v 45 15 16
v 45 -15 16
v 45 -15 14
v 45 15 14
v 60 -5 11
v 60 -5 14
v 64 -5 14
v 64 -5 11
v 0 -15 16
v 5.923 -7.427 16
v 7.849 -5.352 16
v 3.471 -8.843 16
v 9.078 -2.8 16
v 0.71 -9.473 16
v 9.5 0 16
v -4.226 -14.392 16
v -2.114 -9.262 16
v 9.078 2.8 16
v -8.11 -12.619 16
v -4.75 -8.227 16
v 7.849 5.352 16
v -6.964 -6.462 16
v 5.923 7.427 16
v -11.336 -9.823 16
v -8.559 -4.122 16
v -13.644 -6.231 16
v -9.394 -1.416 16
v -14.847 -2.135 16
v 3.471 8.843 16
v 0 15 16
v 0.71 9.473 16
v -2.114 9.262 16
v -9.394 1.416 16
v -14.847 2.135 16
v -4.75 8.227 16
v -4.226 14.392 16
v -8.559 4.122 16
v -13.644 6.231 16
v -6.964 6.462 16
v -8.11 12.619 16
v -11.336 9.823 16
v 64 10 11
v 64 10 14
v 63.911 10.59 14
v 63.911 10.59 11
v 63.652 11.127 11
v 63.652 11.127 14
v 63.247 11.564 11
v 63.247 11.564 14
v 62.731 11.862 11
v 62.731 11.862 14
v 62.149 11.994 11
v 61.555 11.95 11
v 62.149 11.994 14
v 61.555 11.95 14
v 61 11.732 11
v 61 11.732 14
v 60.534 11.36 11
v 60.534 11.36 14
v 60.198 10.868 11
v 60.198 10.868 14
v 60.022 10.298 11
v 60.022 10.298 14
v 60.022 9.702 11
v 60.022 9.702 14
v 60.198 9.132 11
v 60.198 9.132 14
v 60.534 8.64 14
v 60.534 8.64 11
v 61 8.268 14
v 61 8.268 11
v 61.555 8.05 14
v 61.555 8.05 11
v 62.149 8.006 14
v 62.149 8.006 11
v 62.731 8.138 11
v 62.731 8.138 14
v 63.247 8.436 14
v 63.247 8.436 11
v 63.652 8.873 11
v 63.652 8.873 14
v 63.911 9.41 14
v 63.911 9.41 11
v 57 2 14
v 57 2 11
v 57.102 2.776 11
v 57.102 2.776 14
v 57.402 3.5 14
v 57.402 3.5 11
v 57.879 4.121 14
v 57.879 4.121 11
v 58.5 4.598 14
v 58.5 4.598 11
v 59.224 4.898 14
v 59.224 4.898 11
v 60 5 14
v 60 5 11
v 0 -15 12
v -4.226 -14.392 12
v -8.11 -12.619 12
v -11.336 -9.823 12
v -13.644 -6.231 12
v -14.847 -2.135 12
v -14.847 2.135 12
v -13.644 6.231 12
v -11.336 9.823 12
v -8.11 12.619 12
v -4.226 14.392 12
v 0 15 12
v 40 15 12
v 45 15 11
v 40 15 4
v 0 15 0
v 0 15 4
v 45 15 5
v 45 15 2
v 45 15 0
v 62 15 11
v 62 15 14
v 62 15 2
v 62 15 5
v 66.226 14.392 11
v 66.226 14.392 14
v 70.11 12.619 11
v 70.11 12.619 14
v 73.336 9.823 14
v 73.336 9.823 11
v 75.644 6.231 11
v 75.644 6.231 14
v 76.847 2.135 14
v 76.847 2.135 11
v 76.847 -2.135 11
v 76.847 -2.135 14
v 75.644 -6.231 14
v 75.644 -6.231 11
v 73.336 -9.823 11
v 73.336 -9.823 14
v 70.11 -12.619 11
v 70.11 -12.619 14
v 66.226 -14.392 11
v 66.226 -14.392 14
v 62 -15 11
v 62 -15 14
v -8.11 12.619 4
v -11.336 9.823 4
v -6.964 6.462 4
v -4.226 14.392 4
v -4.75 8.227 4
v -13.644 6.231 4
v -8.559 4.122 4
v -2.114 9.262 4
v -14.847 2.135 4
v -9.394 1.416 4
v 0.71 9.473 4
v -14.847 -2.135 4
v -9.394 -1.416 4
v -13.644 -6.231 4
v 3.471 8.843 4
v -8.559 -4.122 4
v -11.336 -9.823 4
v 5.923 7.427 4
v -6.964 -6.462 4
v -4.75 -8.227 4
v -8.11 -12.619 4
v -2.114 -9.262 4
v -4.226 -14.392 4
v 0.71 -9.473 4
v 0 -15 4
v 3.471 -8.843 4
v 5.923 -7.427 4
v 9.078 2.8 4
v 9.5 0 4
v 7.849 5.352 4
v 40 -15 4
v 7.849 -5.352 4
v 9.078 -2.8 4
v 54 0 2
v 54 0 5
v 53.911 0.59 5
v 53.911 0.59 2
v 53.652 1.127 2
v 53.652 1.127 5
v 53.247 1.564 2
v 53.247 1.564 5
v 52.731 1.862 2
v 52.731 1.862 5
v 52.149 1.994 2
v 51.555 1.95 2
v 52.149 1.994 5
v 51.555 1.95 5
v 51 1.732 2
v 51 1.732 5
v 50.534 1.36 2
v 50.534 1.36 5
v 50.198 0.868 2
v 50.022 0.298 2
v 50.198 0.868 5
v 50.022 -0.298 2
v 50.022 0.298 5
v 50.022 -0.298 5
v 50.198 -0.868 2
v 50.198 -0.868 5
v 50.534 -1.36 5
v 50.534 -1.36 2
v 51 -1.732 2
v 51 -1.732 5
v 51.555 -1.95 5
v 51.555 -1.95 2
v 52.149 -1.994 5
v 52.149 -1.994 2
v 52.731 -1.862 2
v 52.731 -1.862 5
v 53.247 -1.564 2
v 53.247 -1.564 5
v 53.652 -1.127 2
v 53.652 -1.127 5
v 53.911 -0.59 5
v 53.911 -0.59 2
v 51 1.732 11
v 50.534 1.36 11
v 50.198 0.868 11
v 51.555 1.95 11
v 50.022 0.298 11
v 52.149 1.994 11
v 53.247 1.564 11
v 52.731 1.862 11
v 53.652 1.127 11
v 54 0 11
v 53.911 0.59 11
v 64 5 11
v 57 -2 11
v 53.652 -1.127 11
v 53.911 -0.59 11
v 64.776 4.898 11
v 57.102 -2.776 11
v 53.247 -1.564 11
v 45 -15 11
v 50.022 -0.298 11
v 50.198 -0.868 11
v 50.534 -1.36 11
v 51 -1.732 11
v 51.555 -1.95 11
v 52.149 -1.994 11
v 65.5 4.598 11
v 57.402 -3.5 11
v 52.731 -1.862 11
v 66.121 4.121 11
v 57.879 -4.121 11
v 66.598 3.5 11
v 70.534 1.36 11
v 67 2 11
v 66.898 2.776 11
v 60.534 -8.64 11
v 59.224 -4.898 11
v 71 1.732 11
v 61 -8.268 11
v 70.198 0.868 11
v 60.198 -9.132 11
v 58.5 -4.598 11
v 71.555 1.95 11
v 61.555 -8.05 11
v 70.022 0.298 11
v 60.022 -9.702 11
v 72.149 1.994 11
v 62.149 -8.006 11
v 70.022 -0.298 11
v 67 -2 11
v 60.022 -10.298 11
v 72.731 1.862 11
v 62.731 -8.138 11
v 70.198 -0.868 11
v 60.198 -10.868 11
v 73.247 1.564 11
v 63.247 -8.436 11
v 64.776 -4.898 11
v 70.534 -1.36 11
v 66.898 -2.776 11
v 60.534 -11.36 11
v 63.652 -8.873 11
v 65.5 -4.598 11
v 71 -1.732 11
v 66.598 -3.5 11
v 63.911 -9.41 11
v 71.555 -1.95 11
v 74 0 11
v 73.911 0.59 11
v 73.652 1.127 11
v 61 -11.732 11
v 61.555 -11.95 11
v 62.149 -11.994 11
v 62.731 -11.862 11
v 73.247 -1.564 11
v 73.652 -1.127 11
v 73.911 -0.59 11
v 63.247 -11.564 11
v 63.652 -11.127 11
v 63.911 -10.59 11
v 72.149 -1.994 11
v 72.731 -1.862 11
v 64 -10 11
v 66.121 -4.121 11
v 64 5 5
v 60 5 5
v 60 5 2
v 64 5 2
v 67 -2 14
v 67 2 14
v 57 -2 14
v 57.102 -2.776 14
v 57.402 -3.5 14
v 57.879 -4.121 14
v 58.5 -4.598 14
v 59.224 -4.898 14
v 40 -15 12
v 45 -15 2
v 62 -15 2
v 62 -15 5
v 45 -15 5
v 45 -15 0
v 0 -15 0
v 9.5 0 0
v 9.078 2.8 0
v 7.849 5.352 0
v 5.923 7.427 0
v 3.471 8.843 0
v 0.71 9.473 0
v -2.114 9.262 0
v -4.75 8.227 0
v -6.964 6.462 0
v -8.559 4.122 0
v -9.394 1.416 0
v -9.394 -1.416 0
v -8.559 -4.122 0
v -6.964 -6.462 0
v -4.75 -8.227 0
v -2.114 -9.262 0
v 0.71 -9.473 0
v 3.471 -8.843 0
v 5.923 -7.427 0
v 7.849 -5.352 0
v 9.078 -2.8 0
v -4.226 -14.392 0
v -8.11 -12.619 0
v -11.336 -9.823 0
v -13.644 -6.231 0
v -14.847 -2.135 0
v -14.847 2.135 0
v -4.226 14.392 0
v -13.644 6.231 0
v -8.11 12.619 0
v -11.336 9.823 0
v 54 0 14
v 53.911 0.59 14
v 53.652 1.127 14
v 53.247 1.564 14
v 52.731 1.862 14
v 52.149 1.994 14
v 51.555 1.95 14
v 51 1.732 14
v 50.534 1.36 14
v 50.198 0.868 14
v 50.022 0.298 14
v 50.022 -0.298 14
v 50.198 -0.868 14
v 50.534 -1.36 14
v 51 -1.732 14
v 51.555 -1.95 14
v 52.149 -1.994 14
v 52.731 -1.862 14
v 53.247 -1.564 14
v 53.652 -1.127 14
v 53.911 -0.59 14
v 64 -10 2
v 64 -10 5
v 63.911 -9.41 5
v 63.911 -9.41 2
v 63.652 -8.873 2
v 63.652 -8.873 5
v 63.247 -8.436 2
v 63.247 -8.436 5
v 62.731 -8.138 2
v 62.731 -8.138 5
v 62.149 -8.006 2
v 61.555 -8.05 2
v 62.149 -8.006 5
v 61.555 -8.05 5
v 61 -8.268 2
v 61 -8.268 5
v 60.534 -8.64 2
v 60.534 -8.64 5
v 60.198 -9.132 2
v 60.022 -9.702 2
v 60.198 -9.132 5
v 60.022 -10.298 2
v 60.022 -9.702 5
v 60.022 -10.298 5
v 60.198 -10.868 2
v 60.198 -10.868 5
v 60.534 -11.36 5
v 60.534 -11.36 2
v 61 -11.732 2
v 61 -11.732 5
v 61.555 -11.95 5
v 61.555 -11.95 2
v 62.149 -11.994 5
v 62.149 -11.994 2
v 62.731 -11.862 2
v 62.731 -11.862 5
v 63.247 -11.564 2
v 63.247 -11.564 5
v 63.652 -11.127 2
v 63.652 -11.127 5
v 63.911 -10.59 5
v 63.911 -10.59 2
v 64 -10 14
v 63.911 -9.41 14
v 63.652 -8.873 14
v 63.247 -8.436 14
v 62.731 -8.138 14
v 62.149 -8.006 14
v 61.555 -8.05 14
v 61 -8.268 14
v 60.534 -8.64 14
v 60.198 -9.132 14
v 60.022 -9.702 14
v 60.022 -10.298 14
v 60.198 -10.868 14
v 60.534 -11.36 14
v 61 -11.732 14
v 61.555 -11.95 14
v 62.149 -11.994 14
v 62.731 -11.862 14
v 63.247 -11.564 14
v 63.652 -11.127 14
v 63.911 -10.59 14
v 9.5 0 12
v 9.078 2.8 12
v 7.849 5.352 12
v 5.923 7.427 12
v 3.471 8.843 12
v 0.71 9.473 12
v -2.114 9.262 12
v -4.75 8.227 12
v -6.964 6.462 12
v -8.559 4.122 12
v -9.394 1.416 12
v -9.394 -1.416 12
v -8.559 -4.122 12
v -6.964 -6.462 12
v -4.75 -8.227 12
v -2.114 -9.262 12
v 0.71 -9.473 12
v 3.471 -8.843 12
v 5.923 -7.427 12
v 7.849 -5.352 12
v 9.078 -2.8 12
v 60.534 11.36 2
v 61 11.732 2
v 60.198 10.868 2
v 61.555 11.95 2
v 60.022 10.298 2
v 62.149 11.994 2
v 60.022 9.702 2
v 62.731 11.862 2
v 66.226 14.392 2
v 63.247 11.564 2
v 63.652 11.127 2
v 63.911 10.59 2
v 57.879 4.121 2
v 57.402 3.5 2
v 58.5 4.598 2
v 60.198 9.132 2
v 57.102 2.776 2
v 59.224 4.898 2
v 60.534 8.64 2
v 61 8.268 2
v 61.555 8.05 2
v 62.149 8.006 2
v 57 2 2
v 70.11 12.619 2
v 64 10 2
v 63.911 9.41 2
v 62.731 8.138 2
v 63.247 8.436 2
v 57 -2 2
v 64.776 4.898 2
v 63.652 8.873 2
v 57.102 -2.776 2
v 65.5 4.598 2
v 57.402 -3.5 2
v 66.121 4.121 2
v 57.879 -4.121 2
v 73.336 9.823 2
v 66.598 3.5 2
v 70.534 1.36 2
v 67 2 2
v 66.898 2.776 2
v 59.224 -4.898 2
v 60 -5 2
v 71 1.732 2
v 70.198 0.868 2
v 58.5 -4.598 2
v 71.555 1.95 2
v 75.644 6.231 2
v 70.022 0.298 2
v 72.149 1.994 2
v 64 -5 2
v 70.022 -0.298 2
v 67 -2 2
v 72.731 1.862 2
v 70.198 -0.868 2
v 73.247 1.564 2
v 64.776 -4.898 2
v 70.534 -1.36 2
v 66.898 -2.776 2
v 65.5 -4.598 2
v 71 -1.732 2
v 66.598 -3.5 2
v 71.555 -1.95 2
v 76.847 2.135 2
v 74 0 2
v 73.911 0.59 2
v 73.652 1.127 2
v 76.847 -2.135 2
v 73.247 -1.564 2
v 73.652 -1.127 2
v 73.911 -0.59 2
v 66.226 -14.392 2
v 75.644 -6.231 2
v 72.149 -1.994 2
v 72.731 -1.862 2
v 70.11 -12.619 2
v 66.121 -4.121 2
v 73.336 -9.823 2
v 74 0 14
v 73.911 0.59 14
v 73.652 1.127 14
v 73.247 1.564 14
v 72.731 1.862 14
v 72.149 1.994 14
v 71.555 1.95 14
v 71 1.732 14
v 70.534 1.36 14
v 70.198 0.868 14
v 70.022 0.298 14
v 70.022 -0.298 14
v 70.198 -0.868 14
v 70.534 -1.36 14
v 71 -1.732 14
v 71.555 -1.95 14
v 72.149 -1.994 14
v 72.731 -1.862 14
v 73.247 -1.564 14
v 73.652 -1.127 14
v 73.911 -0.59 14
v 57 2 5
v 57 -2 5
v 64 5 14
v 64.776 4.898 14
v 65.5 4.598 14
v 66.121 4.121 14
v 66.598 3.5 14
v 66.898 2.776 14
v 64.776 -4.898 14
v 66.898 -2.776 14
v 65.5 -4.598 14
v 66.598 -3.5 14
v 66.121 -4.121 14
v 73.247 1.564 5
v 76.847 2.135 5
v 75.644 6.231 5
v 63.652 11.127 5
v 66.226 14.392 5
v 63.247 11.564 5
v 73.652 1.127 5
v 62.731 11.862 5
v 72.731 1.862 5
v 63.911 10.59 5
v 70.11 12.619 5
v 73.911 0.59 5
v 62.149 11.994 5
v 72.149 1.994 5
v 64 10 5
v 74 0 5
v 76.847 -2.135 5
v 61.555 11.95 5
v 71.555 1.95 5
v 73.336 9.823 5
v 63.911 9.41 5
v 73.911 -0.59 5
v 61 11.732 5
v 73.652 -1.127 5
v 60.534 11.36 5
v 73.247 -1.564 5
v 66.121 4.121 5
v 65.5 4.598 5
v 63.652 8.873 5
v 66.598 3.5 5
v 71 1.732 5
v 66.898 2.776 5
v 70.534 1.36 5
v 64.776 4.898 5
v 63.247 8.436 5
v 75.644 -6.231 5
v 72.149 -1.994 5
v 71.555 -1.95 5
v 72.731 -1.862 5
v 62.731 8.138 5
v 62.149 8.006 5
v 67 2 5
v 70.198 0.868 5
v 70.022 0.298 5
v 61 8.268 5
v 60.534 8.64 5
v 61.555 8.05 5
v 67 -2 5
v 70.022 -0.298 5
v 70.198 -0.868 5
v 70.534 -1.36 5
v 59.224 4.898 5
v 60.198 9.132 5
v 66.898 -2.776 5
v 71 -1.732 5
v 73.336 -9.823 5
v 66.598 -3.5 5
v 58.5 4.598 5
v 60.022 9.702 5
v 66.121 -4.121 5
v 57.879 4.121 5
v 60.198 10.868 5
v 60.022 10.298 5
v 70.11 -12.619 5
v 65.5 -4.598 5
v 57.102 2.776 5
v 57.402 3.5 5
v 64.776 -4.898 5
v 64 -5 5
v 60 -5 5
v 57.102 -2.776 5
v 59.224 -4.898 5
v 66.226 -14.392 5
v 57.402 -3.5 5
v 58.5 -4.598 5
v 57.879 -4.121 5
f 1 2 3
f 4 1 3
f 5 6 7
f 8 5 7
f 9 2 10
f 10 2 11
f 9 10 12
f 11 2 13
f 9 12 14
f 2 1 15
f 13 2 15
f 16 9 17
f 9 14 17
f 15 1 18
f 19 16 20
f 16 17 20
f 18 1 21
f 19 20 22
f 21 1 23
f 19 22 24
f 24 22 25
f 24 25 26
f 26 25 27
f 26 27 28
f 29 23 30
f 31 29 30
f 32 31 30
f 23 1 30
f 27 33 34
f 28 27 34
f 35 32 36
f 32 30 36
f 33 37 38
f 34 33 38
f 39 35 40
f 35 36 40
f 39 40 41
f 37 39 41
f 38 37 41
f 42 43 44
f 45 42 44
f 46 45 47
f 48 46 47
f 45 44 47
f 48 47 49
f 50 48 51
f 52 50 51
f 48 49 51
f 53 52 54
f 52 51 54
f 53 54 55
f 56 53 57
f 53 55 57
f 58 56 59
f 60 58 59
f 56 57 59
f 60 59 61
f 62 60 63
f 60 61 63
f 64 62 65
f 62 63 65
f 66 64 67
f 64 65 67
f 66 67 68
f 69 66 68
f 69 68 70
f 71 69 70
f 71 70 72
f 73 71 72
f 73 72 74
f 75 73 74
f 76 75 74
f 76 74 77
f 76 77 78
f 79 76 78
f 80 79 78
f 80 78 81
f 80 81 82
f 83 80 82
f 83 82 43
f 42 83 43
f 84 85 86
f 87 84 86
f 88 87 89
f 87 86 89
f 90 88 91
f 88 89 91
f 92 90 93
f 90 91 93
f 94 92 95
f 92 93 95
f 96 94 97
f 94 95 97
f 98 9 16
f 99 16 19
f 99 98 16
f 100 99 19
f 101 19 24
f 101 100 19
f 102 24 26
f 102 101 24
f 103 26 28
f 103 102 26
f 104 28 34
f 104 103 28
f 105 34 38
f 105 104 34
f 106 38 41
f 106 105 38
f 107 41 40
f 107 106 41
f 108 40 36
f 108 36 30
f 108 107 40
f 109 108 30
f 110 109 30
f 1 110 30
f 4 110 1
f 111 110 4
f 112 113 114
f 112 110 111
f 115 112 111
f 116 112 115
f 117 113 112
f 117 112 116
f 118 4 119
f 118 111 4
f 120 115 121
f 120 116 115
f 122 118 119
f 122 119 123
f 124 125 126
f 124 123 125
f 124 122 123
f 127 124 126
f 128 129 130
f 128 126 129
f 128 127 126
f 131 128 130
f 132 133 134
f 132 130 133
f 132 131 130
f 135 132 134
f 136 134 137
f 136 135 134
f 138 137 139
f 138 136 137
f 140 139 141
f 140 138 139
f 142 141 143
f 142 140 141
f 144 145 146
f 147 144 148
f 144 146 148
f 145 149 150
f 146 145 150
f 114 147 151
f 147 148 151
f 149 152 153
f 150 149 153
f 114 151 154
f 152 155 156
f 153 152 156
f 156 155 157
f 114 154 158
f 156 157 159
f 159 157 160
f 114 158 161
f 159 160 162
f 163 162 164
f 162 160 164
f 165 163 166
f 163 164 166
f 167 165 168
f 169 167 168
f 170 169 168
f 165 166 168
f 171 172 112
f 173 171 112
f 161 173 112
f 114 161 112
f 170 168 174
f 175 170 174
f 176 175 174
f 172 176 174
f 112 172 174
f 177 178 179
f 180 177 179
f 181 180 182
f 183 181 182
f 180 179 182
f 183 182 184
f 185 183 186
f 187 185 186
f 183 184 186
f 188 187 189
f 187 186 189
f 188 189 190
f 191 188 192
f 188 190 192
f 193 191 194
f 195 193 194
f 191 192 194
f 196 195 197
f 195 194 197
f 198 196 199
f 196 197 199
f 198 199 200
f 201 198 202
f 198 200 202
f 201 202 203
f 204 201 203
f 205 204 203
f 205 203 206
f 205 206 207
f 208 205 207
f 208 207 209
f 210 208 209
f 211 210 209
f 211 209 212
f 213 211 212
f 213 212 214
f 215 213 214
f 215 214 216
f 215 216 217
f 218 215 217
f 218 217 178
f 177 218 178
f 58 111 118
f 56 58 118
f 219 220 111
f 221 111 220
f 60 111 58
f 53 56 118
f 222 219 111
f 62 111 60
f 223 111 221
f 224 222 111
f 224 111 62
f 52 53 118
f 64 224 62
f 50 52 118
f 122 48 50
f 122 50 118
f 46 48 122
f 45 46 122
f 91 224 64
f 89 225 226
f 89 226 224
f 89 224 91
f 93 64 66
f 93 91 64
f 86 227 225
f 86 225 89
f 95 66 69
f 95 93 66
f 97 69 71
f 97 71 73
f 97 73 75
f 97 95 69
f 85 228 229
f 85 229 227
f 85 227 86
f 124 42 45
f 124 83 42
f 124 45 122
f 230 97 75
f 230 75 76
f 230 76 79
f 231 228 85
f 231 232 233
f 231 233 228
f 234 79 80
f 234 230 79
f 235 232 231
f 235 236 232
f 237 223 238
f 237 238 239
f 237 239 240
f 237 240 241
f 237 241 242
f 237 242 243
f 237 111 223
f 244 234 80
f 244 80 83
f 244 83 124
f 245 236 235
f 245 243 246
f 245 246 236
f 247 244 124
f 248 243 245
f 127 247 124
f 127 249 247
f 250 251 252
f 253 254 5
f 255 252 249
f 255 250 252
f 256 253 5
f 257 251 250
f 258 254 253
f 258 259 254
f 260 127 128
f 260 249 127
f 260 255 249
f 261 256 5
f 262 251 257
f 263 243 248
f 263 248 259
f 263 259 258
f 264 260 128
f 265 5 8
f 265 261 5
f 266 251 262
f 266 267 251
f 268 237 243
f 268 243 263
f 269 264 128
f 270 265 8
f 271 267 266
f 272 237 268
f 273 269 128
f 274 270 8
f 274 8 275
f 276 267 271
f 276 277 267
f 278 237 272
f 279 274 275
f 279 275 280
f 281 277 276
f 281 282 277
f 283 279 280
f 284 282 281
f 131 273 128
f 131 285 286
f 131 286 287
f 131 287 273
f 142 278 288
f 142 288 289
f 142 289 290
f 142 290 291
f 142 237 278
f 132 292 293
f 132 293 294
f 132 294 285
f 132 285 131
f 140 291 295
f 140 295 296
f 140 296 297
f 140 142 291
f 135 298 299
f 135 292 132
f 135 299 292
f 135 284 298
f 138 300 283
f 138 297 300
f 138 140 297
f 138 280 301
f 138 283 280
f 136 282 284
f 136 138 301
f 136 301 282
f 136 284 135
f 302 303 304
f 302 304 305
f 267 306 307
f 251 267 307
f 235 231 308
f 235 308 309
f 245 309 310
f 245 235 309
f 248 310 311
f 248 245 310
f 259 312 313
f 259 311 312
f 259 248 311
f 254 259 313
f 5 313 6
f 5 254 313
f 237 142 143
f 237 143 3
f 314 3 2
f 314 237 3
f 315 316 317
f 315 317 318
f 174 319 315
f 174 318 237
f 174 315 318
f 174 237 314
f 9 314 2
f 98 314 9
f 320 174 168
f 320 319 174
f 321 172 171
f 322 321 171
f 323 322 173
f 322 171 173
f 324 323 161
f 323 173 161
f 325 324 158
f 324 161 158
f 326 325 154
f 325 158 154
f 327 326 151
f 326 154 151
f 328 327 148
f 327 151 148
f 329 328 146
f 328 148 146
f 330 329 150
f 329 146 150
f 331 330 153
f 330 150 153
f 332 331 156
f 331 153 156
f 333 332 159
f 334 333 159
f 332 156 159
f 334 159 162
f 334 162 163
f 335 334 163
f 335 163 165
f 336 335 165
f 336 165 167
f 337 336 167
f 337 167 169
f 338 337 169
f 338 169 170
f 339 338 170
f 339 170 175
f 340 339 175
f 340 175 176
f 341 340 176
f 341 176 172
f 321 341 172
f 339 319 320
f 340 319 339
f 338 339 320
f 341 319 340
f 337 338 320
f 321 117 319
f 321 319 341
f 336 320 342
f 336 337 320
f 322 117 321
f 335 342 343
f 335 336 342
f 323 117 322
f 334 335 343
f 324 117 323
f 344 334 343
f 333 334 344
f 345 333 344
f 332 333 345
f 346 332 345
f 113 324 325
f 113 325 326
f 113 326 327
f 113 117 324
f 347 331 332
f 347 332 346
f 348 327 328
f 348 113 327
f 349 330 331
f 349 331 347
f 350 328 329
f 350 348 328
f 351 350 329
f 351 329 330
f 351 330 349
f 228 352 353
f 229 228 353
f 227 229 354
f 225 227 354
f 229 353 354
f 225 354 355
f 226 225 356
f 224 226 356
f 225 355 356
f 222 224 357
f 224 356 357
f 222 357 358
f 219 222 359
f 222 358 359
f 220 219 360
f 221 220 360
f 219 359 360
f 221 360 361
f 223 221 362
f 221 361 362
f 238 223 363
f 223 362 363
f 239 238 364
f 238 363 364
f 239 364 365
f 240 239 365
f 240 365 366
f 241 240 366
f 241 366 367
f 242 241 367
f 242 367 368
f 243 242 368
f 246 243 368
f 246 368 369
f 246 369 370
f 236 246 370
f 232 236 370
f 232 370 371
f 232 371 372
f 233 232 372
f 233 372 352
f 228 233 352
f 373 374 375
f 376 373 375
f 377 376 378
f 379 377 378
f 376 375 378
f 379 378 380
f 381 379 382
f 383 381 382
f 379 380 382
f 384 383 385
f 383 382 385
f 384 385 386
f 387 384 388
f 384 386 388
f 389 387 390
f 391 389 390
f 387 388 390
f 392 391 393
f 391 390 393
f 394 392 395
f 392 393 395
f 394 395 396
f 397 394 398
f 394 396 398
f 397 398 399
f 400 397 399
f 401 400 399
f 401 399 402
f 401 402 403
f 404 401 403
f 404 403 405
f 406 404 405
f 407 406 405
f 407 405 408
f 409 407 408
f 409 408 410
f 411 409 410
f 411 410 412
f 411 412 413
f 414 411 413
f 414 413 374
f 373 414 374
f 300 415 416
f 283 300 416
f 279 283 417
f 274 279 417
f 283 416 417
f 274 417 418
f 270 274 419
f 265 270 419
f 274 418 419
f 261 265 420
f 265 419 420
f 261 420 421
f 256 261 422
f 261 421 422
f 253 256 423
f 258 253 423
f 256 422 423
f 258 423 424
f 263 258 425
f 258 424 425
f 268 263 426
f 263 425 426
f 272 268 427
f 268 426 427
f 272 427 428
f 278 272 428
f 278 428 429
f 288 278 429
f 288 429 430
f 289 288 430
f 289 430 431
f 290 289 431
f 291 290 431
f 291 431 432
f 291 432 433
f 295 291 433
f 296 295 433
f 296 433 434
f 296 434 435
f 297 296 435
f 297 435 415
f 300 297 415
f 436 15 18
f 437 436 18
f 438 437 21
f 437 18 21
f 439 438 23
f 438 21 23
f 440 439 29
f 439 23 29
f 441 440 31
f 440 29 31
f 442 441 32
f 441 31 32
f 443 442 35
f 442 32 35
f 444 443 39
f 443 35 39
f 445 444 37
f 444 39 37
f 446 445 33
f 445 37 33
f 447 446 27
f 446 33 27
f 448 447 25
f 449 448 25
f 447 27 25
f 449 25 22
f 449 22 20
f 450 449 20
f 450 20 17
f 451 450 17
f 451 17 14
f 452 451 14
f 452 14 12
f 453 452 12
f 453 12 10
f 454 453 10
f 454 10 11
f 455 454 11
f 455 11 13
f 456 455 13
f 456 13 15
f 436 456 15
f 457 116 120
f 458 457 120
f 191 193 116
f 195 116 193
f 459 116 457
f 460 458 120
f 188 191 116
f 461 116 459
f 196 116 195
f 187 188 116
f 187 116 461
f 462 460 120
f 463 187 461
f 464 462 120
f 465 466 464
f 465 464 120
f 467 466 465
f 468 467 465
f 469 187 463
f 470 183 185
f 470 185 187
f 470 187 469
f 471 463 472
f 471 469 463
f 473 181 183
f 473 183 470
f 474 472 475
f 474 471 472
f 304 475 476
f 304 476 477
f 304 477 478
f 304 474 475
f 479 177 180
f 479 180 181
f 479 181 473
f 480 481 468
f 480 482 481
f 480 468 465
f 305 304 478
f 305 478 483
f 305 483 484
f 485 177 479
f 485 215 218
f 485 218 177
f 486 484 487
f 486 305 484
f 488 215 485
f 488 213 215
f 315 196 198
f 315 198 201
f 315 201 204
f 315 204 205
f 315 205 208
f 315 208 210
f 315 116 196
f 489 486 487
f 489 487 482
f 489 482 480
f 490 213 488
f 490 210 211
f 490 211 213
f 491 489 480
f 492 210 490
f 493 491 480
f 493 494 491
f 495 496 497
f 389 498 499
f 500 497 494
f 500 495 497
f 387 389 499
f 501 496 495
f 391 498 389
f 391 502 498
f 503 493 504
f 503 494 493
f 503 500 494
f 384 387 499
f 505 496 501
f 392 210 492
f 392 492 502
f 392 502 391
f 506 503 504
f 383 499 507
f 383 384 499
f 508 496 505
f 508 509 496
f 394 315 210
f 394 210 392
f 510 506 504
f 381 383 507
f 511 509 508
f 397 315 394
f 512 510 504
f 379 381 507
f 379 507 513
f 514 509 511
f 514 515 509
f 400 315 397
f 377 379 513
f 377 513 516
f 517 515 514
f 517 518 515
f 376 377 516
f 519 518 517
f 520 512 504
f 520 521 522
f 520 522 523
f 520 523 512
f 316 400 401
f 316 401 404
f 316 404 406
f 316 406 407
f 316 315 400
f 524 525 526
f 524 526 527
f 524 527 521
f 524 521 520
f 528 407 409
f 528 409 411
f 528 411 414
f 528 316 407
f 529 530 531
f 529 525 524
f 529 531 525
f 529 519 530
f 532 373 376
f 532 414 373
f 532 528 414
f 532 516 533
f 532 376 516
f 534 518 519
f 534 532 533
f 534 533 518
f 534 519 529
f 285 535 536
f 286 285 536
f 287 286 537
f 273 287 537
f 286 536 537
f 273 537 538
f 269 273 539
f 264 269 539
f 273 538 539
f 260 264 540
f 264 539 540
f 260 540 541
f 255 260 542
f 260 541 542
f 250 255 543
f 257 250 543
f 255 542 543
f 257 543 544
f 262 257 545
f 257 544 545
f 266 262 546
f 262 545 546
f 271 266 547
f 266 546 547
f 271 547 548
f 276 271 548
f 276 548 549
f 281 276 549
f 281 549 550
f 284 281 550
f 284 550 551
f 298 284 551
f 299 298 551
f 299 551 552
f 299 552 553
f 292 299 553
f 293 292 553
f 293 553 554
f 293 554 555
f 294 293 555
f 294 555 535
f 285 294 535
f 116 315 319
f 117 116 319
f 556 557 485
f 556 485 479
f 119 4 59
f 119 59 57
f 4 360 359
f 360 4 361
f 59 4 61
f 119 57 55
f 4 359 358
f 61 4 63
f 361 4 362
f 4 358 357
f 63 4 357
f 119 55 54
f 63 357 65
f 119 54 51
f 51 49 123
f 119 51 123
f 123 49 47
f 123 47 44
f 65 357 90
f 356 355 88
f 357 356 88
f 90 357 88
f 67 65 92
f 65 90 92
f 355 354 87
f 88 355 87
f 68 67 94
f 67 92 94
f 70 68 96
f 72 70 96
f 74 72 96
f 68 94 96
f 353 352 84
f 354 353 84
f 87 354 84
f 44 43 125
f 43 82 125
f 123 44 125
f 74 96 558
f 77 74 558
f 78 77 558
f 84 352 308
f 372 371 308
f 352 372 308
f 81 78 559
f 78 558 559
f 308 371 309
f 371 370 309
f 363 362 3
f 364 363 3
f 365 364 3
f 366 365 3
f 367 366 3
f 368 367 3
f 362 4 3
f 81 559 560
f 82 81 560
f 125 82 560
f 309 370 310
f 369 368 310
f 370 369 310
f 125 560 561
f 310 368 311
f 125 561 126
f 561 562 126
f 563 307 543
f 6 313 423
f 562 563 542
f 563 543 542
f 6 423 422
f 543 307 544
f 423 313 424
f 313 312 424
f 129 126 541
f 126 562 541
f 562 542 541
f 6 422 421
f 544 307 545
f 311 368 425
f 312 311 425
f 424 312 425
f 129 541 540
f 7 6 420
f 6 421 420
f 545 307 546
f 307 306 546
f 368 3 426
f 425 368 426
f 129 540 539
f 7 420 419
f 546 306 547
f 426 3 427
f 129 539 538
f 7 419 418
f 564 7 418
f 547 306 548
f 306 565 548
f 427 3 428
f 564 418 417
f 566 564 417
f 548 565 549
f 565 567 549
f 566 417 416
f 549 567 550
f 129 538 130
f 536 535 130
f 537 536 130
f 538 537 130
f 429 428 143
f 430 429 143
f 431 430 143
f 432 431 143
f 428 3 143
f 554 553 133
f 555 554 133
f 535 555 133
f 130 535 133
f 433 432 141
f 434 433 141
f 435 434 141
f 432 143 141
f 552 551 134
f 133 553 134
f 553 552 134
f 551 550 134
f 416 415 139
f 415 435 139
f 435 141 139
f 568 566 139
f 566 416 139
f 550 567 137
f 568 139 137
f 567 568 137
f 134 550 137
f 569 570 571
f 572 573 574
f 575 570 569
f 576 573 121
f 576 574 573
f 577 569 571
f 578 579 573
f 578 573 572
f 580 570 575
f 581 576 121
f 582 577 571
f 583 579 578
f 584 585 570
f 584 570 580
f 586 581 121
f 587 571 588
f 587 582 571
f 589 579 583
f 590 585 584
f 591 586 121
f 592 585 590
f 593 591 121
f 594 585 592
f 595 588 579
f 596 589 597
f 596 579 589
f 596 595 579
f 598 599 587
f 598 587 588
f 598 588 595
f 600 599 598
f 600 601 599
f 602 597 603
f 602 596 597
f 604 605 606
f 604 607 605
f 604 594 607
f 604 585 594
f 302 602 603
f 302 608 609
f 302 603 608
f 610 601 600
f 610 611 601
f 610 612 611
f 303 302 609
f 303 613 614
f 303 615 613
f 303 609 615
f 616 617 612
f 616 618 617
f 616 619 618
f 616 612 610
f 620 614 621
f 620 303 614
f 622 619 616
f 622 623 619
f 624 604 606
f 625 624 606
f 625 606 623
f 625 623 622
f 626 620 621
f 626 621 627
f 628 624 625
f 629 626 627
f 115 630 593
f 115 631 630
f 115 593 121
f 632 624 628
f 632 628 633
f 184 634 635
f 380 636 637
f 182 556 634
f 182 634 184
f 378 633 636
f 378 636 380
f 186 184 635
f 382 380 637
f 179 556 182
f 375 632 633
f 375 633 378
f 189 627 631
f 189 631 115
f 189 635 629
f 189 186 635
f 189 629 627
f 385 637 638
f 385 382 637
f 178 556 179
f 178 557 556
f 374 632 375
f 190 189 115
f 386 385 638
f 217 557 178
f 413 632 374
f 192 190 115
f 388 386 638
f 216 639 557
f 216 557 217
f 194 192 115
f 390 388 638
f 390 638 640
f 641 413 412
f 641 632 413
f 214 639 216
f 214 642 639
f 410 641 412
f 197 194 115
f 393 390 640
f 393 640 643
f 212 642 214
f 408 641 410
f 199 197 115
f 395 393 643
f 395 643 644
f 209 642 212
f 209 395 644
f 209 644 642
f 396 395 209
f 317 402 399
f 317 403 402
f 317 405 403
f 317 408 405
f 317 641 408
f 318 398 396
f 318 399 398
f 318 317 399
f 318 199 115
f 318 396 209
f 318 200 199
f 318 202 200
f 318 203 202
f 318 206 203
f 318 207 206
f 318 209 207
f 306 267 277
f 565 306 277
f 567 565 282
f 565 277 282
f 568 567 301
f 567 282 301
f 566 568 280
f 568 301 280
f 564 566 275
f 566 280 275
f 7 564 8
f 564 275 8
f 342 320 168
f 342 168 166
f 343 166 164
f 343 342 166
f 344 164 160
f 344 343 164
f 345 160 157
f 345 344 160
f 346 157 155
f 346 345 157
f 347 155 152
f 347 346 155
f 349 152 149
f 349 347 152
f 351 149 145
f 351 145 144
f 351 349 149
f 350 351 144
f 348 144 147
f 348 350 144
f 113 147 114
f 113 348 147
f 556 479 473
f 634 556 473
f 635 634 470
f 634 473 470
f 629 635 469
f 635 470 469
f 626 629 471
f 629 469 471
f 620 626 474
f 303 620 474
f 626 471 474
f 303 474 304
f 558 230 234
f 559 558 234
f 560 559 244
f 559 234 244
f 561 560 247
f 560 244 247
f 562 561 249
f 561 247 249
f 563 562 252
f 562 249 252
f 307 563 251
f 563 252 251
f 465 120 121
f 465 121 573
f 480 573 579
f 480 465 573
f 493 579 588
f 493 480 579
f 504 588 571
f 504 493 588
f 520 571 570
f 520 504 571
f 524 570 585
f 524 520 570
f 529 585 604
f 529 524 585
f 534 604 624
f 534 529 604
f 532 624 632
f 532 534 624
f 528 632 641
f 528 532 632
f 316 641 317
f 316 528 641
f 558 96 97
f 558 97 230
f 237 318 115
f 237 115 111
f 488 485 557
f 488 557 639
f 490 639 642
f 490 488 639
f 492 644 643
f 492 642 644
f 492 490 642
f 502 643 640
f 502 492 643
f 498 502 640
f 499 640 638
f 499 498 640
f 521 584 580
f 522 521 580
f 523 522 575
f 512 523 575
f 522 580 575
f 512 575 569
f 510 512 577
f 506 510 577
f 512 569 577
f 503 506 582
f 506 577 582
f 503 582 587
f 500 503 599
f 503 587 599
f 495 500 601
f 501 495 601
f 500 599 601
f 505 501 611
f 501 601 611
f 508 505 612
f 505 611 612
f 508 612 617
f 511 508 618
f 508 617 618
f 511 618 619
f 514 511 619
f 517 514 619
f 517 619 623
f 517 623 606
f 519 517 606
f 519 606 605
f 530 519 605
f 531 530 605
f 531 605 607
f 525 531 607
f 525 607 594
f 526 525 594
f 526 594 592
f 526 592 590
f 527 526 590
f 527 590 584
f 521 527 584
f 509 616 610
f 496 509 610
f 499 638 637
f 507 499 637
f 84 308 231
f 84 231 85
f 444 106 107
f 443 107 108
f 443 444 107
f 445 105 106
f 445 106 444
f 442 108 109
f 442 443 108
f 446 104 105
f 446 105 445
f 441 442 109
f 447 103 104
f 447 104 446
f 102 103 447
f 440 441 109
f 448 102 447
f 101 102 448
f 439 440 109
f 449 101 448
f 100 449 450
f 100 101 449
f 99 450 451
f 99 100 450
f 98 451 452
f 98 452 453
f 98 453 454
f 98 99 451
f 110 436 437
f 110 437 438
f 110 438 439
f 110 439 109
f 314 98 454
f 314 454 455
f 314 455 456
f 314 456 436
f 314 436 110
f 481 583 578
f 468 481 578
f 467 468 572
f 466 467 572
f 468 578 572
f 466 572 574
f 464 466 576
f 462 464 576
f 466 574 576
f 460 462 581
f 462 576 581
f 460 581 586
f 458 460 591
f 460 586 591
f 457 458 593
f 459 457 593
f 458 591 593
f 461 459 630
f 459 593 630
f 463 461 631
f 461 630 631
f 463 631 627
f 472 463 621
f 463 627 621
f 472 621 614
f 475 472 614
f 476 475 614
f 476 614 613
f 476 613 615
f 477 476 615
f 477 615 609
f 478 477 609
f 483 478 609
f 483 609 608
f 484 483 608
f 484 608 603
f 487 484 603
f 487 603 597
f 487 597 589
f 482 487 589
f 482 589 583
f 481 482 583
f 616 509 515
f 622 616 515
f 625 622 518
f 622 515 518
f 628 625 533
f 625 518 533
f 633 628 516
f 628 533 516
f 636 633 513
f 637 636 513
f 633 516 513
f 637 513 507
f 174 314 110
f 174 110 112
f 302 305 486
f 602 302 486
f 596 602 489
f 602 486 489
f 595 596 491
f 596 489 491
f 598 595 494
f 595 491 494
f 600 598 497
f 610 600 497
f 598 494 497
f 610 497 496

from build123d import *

# Parameters (mm, degrees)
EXTRUDE_1_DEPTH          = 16
SKETCH_2_R               = 9.5
SKETCH_2_R_2             = 2
SKETCH_2_W               = 10
SKETCH_2_H               = 10
CUT_EXTRUDE_1_DEPTH      = 16
FILLET_1_R               = 3
CUT_EXTRUDE_5_DEPTH      = 15
CUT_EXTRUDE_5_DEPTH_BACK = 15
SKETCH_4_W               = 55
SKETCH_4_H               = 8
CUT_EXTRUDE_6_DEPTH      = 15
CUT_EXTRUDE_6_DEPTH_BACK = 15
SKETCH_5_W               = 32
SKETCH_5_H               = 2


with BuildPart() as part:
    # 草图1 → 凸台-拉伸1 (new body)
    with BuildSketch(Plane.XY):
        with BuildLine():
            Line((0, 15), (62, 15))
            ThreePointArc((62, 15), (77, 0), (62, -15))
            Line((62, -15), (0, -15))
            ThreePointArc((0, -15), (-15, 0), (0, 15))
        make_face()
    extrude(amount=EXTRUDE_1_DEPTH)

    # 草图2 → 切除-拉伸1 (cut)
    with BuildSketch(Plane.XY.offset(16)):
        Circle(SKETCH_2_R)
        with Locations((62, 10)):
            Circle(SKETCH_2_R_2)
        with Locations((72, 0)):
            Circle(SKETCH_2_R_2)
        with Locations((62, -10)):
            Circle(SKETCH_2_R_2)
        with Locations((52, 0)):
            Circle(SKETCH_2_R_2)
        with Locations((62, 0)):
            Rectangle(SKETCH_2_W, SKETCH_2_H)
    extrude(amount=-CUT_EXTRUDE_1_DEPTH, mode=Mode.SUBTRACT)

    # 圆角1
    fillet_1_edges = [part.edges().sort_by_distance(p)[0] for p in [
        (67, 5, 8),
        (67, -5, 8),
        (57, -5, 8),
        (57, 5, 8),
    ]]
    fillet(fillet_1_edges, radius=FILLET_1_R)

    # 草图4 → 切除-拉伸5 (cut, two sides: drawn at the far end of the back side and taken through both)
    with BuildSketch(Plane(origin=(0, 0, 0), x_dir=(1, 0, 0), z_dir=(0, 1, 0)).offset(-CUT_EXTRUDE_5_DEPTH_BACK)):
        with Locations((12.5, -8)):
            Rectangle(SKETCH_4_W, SKETCH_4_H)
    extrude(amount=CUT_EXTRUDE_5_DEPTH + CUT_EXTRUDE_5_DEPTH_BACK, mode=Mode.SUBTRACT)

    # 草图5 → 切除-拉伸6 (cut, two sides: drawn at the far end of the back side and taken through both)
    with BuildSketch(Plane(origin=(0, 0, 0), x_dir=(1, 0, 0), z_dir=(0, 1, 0)).offset(-CUT_EXTRUDE_6_DEPTH_BACK)):
        Polygon((45, -8), (45, -11), (77, -11), (77, -5), (45, -5), align=None)
        with Locations((61, -1)):
            Rectangle(SKETCH_5_W, SKETCH_5_H)
        with Locations((61, -15)):
            Rectangle(SKETCH_5_W, SKETCH_5_H)
    extrude(amount=CUT_EXTRUDE_6_DEPTH + CUT_EXTRUDE_6_DEPTH_BACK, mode=Mode.SUBTRACT)


solid = part.part
